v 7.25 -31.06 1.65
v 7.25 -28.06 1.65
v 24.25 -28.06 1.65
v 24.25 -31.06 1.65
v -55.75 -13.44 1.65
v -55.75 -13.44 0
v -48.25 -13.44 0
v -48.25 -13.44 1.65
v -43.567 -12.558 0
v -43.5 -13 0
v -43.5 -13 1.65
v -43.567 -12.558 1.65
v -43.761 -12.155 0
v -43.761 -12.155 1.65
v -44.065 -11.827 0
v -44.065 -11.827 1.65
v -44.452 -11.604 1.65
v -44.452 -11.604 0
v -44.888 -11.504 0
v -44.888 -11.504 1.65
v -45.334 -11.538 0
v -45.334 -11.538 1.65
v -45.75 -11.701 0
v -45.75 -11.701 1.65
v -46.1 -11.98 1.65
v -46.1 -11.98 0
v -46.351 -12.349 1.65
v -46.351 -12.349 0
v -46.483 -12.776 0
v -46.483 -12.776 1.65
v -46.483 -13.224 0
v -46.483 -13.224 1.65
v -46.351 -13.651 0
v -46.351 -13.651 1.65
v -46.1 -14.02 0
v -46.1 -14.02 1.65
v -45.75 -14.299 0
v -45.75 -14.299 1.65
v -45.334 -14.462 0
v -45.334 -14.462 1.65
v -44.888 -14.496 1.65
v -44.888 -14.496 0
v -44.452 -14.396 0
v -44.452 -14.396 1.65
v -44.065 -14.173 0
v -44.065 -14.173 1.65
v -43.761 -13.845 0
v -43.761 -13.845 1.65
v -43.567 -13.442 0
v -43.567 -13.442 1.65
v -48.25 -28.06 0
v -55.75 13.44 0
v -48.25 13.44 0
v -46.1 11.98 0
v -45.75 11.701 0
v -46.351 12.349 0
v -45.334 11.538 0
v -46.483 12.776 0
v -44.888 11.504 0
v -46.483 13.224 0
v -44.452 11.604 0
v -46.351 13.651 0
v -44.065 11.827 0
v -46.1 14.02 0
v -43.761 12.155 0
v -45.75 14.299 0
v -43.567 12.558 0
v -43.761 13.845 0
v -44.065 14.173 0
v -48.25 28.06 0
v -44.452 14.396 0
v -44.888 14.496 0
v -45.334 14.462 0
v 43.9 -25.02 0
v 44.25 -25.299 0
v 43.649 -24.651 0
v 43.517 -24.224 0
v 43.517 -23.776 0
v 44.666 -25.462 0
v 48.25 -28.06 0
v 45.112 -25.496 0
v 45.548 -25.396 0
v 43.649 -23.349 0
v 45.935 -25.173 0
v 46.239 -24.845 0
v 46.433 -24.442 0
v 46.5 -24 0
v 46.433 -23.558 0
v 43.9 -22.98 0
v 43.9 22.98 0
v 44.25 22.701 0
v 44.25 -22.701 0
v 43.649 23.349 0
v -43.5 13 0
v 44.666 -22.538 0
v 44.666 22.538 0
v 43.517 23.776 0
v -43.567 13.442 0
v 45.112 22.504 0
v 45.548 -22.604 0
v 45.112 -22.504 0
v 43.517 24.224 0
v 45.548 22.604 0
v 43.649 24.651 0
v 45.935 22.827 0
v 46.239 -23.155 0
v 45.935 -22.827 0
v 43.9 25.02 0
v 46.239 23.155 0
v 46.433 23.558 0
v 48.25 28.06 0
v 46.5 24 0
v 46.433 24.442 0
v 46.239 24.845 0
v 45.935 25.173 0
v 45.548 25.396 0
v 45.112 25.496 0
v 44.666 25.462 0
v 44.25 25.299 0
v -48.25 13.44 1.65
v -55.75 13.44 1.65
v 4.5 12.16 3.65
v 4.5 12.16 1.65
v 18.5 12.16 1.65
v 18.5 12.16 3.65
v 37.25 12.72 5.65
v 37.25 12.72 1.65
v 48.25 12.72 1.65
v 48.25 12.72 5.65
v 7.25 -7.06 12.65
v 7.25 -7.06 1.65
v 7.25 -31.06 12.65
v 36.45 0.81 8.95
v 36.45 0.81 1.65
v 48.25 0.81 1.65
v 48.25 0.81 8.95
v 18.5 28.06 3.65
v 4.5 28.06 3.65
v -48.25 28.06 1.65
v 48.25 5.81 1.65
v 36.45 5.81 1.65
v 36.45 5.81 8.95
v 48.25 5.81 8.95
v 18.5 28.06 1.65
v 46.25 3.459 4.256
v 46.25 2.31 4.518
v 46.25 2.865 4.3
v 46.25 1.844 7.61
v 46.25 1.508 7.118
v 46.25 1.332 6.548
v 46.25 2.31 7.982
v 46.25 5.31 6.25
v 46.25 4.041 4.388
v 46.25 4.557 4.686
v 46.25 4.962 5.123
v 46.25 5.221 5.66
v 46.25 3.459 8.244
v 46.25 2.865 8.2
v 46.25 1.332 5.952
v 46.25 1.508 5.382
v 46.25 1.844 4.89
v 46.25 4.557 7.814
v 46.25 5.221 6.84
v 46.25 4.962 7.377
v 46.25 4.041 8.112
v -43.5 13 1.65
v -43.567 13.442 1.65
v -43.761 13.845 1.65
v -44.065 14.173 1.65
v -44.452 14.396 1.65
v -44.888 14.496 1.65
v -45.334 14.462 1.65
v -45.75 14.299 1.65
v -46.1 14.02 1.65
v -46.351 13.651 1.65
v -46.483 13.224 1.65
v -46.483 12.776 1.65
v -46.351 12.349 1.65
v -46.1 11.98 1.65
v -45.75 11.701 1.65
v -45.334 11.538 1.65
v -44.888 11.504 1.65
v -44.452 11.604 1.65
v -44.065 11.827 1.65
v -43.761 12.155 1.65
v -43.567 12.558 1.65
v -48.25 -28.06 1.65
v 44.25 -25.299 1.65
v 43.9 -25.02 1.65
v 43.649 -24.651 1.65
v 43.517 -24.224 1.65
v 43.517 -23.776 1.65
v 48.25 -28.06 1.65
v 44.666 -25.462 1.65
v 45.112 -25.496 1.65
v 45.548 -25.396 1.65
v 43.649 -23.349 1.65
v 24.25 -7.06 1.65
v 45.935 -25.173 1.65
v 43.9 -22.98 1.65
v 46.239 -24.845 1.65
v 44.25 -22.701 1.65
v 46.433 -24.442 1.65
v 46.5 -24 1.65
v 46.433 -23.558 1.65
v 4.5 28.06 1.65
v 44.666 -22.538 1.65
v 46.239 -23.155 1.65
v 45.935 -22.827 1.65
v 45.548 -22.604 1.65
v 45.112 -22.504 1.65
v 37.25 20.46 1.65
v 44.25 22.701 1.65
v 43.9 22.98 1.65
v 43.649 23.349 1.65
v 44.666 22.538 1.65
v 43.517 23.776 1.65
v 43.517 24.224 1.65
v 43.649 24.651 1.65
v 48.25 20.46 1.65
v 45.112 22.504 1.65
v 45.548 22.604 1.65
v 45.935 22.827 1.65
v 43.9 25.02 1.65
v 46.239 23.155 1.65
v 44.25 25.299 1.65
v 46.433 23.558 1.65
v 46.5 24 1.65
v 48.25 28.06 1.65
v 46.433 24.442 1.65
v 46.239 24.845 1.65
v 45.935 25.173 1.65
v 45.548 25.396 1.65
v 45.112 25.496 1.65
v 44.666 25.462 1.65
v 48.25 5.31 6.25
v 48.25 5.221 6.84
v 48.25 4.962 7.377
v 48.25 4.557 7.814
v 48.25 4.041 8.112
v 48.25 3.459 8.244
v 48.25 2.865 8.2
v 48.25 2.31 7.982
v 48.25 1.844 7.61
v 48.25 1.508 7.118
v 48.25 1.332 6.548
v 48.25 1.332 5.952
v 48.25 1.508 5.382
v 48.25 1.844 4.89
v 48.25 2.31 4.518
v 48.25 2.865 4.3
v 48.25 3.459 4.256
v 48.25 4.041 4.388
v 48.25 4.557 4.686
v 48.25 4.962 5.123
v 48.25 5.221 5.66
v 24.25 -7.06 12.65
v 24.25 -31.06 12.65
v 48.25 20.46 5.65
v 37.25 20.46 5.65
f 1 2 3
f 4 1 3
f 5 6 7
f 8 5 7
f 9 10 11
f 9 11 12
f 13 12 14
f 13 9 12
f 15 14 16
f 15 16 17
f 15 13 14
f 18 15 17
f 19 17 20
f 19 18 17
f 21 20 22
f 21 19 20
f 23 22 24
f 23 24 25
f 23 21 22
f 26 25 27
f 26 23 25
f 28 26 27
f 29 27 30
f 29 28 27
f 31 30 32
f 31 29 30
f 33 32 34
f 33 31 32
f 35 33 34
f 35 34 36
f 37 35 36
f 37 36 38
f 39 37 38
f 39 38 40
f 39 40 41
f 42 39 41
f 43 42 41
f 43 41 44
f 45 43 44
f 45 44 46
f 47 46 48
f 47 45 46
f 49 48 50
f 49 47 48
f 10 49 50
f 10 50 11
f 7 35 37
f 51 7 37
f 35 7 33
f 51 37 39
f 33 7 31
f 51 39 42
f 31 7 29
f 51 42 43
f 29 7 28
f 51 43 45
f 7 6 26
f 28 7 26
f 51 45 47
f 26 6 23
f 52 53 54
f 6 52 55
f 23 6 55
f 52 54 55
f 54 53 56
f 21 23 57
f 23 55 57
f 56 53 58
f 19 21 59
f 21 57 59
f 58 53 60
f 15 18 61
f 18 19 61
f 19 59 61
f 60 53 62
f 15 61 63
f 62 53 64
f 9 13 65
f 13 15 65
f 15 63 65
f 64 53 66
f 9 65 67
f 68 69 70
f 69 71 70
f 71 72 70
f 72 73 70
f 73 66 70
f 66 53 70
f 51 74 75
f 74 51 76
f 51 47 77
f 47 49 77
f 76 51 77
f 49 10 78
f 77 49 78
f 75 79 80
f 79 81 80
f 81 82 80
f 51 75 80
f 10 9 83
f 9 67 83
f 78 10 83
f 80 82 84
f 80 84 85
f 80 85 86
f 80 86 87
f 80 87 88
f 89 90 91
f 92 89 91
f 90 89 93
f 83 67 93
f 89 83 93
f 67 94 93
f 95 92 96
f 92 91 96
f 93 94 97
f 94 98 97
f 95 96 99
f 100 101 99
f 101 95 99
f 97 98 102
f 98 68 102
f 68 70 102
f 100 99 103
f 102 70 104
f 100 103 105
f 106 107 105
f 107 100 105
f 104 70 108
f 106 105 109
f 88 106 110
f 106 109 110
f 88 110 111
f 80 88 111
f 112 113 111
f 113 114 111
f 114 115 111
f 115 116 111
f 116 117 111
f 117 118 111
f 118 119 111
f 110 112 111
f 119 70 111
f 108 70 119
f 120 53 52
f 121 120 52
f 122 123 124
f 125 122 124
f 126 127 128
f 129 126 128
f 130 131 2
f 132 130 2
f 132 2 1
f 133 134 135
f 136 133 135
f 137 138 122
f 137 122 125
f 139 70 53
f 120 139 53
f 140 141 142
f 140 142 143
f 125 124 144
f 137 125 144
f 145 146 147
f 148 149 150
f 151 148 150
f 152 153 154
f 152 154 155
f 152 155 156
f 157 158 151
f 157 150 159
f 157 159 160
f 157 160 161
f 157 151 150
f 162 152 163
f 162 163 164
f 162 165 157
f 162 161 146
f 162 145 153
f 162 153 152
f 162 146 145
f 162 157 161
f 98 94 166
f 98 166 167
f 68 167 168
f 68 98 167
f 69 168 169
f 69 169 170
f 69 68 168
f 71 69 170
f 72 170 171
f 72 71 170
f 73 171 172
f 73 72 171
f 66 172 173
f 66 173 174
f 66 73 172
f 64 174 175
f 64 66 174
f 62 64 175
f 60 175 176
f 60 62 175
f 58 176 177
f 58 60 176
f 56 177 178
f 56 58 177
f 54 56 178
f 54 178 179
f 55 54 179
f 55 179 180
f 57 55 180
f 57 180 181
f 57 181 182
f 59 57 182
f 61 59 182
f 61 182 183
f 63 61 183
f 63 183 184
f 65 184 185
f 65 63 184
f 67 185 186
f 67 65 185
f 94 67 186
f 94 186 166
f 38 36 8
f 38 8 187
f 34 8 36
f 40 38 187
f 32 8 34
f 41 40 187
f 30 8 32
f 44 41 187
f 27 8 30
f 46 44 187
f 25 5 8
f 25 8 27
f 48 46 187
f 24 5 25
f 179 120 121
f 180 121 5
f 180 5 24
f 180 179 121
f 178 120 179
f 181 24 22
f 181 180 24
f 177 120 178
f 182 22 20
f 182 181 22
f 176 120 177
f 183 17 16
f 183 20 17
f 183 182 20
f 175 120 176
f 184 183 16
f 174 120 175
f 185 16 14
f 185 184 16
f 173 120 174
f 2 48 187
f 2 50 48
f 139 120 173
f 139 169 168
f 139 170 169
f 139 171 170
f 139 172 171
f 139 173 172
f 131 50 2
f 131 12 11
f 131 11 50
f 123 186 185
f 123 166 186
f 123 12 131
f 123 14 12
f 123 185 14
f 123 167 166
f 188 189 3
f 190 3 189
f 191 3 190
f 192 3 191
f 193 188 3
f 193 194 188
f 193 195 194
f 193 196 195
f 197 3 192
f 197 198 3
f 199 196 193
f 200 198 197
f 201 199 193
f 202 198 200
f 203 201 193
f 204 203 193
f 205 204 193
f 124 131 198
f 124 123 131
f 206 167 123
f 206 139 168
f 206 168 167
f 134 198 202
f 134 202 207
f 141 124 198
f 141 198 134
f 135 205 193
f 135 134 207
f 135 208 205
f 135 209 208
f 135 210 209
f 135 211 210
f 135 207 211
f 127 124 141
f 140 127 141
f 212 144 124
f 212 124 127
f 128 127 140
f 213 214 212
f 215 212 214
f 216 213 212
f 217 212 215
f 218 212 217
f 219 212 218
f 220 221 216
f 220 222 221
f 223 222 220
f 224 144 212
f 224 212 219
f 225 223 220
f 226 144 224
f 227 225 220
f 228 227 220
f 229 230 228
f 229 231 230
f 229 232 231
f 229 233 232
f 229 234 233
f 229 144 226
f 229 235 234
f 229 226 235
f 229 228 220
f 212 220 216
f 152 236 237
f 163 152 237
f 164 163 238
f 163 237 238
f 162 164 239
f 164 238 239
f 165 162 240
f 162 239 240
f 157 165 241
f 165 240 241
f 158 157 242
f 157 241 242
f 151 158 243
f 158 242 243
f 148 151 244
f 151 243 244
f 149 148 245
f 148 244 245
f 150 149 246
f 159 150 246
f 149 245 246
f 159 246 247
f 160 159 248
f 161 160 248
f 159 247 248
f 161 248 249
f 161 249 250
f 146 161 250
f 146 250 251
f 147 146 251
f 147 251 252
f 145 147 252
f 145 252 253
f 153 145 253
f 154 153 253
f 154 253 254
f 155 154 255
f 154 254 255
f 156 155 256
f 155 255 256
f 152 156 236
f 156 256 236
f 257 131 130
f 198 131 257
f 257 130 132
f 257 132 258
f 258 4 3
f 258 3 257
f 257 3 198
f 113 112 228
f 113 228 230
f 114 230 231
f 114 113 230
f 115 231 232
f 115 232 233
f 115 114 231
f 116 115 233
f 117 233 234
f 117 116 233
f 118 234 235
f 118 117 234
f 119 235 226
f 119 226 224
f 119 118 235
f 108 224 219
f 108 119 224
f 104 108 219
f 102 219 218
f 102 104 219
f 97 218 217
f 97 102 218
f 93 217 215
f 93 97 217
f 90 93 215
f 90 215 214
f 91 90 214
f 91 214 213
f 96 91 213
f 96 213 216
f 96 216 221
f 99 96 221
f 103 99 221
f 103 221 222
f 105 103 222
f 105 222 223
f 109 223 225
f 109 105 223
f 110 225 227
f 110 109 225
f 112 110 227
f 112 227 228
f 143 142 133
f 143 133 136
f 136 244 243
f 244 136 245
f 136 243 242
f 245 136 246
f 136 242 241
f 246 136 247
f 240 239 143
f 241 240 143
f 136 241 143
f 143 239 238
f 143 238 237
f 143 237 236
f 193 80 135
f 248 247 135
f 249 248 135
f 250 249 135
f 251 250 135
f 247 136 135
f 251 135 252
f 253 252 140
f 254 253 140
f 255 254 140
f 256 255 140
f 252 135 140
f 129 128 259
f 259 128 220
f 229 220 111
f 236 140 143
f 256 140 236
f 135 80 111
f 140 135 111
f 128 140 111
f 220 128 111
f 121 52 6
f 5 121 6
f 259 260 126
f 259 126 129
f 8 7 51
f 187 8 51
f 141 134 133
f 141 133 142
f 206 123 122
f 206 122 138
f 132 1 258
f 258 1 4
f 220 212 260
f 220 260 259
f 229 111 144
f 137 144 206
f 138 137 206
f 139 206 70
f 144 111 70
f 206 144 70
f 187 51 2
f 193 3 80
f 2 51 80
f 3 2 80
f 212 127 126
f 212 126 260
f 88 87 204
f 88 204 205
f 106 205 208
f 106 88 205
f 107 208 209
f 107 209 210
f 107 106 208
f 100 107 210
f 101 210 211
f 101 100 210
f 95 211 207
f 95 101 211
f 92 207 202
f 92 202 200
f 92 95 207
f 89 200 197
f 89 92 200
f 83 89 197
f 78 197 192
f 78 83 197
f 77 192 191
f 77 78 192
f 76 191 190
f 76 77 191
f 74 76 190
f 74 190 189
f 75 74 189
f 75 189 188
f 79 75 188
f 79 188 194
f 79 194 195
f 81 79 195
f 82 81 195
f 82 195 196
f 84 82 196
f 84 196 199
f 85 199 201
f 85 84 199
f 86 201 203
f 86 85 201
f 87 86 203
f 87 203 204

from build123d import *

# Parameters (mm, degrees)
F0_R     = 1.5
F0_W     = 14.2
F0_H     = 15.9
F0_W_2   = 11.8
F0_H_2   = 5
F1_DEPTH = 1.65
F2_W     = 14
F2_H     = 15.9
F3_DEPTH = 2
F2_W_2   = 11
F2_H_2   = 7.74
F4_DEPTH = 4
F2_W_3   = 17
F2_H_3   = 21
F2_H_4   = 3
F5_DEPTH = 11
F6_W     = 11.8
F6_H     = 5
F7_DEPTH = 7.3
F8_R     = 2
F9_DEPTH = 2


with BuildPart() as f1:
    # F0 (on Top) → F1 (new body)
    with BuildSketch(Plane.XY):
        Polygon((4.39, 28.06), (-48.25, 28.06), (-48.25, 13.44), (-55.75, 13.44), (-55.75, 0), (-55.75, -13.44), (-48.25, -13.44), (-48.25, -28.06), (48.25, -28.06), (48.25, 0), (48.25, 0.81), (36.45, 0.81), (36.45, 5.81), (48.25, 5.81), (48.25, 28.06), (18.59, 28.06), (18.59, 12.16), (4.39, 12.16), align=None)
        with Locations((-45, -13)):
            Circle(F0_R, mode=Mode.SUBTRACT)
        with Locations((45, -24)):
            Circle(F0_R, mode=Mode.SUBTRACT)
        with Locations((-45, 13)):
            Circle(F0_R, mode=Mode.SUBTRACT)
        with Locations((45, 24)):
            Circle(F0_R, mode=Mode.SUBTRACT)
        with Locations((11.49, 20.11)):
            Rectangle(F0_W, F0_H)
        with Locations((42.35, 3.31)):
            Rectangle(F0_W_2, F0_H_2)
    extrude(amount=F1_DEPTH)

    # F2 (on face) → F3 (join)
    with BuildSketch(Plane.XY.offset(1.65)):
        with Locations((11.5, 20.11)):
            Rectangle(F2_W, F2_H)
    extrude(amount=F3_DEPTH)

    # F2 (on face) → F4 (join)
    with BuildSketch(Plane.XY.offset(1.65)):
        with Locations((42.75, 16.59)):
            Rectangle(F2_W_2, F2_H_2)
    extrude(amount=F4_DEPTH)

    # F2 (on face) → F5 (join)
    with BuildSketch(Plane.XY.offset(1.65)):
        with Locations((15.75, -17.56)):
            Rectangle(F2_W_3, F2_H_3)
        with Locations((15.75, -29.56)):
            Rectangle(F2_W_3, F2_H_4)
    extrude(amount=F5_DEPTH)

    # F6 (on face) → F7 (join)
    with BuildSketch(Plane.XY.offset(1.65)):
        with Locations((42.35, 3.31)):
            Rectangle(F6_W, F6_H)
    extrude(amount=F7_DEPTH)

    # F8 (on face) → F9 (cut)
    with BuildSketch(Plane.YZ.offset(48.25)):
        with Locations((3.31, 6.25)):
            Circle(F8_R)
    extrude(amount=-F9_DEPTH, mode=Mode.SUBTRACT)


solid = f1.part
